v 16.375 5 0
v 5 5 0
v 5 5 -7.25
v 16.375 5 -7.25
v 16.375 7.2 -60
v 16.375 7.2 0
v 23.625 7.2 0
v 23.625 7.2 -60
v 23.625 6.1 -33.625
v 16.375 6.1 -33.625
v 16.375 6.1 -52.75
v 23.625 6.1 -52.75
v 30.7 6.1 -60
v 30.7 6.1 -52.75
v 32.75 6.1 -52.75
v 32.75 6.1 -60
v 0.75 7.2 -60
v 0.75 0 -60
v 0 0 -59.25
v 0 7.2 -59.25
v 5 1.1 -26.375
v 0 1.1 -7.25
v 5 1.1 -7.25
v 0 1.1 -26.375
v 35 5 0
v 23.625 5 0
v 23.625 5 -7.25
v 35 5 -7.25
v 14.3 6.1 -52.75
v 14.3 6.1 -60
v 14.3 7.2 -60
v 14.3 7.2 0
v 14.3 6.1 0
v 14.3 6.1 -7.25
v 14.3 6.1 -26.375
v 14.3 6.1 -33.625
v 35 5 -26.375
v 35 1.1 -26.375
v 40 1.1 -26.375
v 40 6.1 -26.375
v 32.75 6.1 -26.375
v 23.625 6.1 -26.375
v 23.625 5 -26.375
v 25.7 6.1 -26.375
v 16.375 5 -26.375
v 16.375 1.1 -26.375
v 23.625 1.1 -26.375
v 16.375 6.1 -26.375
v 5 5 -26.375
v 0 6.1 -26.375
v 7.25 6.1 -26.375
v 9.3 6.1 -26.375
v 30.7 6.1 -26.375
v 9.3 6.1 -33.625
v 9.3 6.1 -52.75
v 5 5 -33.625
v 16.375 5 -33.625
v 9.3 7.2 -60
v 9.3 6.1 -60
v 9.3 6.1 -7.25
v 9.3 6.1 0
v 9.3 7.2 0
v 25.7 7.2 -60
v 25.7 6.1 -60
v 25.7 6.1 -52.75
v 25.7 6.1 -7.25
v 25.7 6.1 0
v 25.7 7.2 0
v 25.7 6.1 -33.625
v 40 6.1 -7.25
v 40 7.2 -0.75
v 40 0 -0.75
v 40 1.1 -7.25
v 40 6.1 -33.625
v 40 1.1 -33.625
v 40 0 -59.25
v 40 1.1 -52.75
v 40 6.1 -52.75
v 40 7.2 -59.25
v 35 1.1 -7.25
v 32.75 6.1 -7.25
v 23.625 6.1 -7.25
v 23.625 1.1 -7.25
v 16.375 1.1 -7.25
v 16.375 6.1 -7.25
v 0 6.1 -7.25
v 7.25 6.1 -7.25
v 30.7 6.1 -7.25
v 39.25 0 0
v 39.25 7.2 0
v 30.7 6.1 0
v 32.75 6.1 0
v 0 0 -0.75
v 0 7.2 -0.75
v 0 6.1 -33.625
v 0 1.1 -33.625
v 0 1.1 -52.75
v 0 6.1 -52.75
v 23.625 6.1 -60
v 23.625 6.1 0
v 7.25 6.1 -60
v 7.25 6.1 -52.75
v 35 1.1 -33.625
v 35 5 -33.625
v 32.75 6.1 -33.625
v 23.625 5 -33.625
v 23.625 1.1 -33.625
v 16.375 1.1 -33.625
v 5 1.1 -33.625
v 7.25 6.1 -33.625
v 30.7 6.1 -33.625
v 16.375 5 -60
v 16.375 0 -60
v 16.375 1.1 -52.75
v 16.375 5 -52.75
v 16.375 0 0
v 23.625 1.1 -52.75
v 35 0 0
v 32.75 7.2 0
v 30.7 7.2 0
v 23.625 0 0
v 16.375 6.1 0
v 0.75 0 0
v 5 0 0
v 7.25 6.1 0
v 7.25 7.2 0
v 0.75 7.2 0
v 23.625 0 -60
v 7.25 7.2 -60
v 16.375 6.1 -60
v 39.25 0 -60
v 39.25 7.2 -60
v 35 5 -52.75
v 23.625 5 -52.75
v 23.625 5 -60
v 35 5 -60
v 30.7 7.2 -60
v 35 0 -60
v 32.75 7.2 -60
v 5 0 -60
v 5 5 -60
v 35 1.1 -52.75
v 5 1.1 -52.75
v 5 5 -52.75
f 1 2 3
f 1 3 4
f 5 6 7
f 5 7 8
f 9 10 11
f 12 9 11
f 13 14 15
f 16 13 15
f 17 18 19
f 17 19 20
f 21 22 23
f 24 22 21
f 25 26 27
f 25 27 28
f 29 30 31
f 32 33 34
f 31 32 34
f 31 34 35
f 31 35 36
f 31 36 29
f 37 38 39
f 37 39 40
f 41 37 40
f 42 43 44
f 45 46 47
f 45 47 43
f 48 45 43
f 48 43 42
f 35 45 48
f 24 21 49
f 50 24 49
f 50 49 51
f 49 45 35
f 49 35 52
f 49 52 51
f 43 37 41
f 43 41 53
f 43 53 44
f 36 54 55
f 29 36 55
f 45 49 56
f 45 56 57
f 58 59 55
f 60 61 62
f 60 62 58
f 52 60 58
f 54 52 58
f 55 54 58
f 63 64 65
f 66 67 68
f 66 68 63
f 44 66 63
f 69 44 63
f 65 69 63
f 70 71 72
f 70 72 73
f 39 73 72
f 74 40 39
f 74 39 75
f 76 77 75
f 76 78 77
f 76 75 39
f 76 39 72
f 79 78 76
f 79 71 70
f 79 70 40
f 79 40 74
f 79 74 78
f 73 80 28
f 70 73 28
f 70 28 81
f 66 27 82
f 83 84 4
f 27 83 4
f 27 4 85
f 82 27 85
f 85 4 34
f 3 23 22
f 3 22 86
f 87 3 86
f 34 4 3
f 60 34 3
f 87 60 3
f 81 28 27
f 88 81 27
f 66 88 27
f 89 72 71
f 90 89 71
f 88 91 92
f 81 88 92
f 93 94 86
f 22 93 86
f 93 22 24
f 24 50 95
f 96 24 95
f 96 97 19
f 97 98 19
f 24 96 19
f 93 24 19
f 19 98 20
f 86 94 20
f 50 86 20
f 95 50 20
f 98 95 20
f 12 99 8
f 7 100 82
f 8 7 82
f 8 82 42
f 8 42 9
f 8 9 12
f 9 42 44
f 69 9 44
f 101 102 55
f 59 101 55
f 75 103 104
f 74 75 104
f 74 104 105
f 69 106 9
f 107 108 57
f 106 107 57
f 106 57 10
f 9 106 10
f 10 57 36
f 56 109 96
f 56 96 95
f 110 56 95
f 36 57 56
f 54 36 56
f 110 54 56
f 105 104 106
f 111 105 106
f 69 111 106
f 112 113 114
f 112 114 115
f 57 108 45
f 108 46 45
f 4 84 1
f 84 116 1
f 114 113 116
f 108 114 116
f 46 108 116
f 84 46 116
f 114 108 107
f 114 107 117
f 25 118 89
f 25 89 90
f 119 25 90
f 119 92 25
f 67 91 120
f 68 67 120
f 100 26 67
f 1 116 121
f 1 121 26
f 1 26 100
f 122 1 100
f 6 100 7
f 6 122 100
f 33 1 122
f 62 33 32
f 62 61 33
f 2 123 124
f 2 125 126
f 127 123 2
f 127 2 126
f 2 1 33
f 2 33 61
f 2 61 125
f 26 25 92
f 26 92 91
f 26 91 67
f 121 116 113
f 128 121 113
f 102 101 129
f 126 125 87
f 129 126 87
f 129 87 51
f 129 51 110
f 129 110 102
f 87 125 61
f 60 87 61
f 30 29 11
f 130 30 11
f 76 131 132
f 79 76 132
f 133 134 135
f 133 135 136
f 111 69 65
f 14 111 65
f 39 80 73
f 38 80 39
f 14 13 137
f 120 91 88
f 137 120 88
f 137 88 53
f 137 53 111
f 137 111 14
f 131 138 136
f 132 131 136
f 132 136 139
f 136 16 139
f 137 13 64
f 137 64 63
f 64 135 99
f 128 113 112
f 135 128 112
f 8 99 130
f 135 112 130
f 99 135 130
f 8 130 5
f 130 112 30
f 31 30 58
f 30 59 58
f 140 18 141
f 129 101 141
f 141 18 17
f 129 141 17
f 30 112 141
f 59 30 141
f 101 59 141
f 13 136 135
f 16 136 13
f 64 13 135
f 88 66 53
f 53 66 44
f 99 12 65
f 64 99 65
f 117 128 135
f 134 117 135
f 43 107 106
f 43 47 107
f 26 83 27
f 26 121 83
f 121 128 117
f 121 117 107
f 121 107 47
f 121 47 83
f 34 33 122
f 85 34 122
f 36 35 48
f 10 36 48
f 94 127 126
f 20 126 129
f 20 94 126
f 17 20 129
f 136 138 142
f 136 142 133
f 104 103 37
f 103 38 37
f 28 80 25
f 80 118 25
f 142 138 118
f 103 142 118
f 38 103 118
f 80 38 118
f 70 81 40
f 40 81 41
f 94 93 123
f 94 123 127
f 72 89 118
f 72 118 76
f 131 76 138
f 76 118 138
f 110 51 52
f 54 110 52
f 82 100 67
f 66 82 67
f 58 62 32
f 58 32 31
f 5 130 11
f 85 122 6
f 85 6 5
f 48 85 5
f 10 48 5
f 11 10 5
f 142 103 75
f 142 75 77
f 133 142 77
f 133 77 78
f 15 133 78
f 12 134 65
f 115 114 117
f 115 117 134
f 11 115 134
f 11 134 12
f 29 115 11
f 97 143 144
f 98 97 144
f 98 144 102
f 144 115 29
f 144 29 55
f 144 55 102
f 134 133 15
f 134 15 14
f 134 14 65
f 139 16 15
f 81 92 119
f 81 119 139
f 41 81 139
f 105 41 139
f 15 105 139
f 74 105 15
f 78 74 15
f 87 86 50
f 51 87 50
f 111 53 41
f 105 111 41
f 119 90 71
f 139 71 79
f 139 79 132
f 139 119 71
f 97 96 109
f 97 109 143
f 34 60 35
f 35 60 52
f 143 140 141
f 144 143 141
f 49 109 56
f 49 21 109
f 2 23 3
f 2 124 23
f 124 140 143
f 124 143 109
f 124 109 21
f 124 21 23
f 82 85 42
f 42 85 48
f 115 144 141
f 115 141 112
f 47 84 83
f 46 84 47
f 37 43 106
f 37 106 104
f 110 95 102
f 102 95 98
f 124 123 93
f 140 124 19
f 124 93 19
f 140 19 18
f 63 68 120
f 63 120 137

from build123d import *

# Parameters (mm, degrees)
SCHIZZO1_W                   = 60
SCHIZZO1_H                   = 7.2
SCHIZZO1_W_2                 = 19.125
SCHIZZO1_H_2                 = 5
ESTRUSIONE_ESTRUSIONE1_DEPTH = 40
SCHIZZO2_W                   = 11.375
SCHIZZO2_H                   = 5
SCHIZZO2_W_2                 = 2.075
SCHIZZO2_H_2                 = 1.1
SCHIZZO2_W_3                 = 2.05
TAGLIO_ESTRUSIONE1_DEPTH     = 61
SMUSSO1_SIZE                 = 0.75


with BuildPart() as part:
    # Schizzo1 → Estrusione-Estrusione1 (new body)
    with BuildSketch(Plane(origin=(0, 0, 0), x_dir=(0, 0, -1), z_dir=(1, 0, 0))):
        with Locations((30, 3.6)):
            Rectangle(SCHIZZO1_W, SCHIZZO1_H)
        with Locations((43.1875, 3.6)):
            Rectangle(SCHIZZO1_W_2, SCHIZZO1_H_2, mode=Mode.SUBTRACT)
        with Locations((16.8125, 3.6)):
            Rectangle(SCHIZZO1_W_2, SCHIZZO1_H_2, mode=Mode.SUBTRACT)
    extrude(amount=ESTRUSIONE_ESTRUSIONE1_DEPTH)

    # Schizzo2 → Taglio-Estrusione1 (cut, through all)
    with BuildSketch(Plane.XY):
        with Locations((10.6875, 2.5)):
            Rectangle(SCHIZZO2_W, SCHIZZO2_H)
        with Locations((29.3125, 2.5)):
            Rectangle(SCHIZZO2_W, SCHIZZO2_H)
        with Locations((15.3375, 6.65)):
            Rectangle(SCHIZZO2_W_2, SCHIZZO2_H_2)
        with Locations((8.275, 6.65)):
            Rectangle(SCHIZZO2_W_3, SCHIZZO2_H_2)
        with Locations((24.6625, 6.65)):
            Rectangle(SCHIZZO2_W_2, SCHIZZO2_H_2)
        with Locations((31.725, 6.65)):
            Rectangle(SCHIZZO2_W_3, SCHIZZO2_H_2)
    extrude(amount=-TAGLIO_ESTRUSIONE1_DEPTH, mode=Mode.SUBTRACT)

    # Smusso1
    smusso1_edges = [part.edges().sort_by_distance(p)[0] for p in [
        (40, 3.6, 0),
        (0, 3.6, 0),
        (0, 3.6, -60),
        (40, 3.6, -60),
    ]]
    chamfer(smusso1_edges, length=SMUSSO1_SIZE)


solid = part.part
